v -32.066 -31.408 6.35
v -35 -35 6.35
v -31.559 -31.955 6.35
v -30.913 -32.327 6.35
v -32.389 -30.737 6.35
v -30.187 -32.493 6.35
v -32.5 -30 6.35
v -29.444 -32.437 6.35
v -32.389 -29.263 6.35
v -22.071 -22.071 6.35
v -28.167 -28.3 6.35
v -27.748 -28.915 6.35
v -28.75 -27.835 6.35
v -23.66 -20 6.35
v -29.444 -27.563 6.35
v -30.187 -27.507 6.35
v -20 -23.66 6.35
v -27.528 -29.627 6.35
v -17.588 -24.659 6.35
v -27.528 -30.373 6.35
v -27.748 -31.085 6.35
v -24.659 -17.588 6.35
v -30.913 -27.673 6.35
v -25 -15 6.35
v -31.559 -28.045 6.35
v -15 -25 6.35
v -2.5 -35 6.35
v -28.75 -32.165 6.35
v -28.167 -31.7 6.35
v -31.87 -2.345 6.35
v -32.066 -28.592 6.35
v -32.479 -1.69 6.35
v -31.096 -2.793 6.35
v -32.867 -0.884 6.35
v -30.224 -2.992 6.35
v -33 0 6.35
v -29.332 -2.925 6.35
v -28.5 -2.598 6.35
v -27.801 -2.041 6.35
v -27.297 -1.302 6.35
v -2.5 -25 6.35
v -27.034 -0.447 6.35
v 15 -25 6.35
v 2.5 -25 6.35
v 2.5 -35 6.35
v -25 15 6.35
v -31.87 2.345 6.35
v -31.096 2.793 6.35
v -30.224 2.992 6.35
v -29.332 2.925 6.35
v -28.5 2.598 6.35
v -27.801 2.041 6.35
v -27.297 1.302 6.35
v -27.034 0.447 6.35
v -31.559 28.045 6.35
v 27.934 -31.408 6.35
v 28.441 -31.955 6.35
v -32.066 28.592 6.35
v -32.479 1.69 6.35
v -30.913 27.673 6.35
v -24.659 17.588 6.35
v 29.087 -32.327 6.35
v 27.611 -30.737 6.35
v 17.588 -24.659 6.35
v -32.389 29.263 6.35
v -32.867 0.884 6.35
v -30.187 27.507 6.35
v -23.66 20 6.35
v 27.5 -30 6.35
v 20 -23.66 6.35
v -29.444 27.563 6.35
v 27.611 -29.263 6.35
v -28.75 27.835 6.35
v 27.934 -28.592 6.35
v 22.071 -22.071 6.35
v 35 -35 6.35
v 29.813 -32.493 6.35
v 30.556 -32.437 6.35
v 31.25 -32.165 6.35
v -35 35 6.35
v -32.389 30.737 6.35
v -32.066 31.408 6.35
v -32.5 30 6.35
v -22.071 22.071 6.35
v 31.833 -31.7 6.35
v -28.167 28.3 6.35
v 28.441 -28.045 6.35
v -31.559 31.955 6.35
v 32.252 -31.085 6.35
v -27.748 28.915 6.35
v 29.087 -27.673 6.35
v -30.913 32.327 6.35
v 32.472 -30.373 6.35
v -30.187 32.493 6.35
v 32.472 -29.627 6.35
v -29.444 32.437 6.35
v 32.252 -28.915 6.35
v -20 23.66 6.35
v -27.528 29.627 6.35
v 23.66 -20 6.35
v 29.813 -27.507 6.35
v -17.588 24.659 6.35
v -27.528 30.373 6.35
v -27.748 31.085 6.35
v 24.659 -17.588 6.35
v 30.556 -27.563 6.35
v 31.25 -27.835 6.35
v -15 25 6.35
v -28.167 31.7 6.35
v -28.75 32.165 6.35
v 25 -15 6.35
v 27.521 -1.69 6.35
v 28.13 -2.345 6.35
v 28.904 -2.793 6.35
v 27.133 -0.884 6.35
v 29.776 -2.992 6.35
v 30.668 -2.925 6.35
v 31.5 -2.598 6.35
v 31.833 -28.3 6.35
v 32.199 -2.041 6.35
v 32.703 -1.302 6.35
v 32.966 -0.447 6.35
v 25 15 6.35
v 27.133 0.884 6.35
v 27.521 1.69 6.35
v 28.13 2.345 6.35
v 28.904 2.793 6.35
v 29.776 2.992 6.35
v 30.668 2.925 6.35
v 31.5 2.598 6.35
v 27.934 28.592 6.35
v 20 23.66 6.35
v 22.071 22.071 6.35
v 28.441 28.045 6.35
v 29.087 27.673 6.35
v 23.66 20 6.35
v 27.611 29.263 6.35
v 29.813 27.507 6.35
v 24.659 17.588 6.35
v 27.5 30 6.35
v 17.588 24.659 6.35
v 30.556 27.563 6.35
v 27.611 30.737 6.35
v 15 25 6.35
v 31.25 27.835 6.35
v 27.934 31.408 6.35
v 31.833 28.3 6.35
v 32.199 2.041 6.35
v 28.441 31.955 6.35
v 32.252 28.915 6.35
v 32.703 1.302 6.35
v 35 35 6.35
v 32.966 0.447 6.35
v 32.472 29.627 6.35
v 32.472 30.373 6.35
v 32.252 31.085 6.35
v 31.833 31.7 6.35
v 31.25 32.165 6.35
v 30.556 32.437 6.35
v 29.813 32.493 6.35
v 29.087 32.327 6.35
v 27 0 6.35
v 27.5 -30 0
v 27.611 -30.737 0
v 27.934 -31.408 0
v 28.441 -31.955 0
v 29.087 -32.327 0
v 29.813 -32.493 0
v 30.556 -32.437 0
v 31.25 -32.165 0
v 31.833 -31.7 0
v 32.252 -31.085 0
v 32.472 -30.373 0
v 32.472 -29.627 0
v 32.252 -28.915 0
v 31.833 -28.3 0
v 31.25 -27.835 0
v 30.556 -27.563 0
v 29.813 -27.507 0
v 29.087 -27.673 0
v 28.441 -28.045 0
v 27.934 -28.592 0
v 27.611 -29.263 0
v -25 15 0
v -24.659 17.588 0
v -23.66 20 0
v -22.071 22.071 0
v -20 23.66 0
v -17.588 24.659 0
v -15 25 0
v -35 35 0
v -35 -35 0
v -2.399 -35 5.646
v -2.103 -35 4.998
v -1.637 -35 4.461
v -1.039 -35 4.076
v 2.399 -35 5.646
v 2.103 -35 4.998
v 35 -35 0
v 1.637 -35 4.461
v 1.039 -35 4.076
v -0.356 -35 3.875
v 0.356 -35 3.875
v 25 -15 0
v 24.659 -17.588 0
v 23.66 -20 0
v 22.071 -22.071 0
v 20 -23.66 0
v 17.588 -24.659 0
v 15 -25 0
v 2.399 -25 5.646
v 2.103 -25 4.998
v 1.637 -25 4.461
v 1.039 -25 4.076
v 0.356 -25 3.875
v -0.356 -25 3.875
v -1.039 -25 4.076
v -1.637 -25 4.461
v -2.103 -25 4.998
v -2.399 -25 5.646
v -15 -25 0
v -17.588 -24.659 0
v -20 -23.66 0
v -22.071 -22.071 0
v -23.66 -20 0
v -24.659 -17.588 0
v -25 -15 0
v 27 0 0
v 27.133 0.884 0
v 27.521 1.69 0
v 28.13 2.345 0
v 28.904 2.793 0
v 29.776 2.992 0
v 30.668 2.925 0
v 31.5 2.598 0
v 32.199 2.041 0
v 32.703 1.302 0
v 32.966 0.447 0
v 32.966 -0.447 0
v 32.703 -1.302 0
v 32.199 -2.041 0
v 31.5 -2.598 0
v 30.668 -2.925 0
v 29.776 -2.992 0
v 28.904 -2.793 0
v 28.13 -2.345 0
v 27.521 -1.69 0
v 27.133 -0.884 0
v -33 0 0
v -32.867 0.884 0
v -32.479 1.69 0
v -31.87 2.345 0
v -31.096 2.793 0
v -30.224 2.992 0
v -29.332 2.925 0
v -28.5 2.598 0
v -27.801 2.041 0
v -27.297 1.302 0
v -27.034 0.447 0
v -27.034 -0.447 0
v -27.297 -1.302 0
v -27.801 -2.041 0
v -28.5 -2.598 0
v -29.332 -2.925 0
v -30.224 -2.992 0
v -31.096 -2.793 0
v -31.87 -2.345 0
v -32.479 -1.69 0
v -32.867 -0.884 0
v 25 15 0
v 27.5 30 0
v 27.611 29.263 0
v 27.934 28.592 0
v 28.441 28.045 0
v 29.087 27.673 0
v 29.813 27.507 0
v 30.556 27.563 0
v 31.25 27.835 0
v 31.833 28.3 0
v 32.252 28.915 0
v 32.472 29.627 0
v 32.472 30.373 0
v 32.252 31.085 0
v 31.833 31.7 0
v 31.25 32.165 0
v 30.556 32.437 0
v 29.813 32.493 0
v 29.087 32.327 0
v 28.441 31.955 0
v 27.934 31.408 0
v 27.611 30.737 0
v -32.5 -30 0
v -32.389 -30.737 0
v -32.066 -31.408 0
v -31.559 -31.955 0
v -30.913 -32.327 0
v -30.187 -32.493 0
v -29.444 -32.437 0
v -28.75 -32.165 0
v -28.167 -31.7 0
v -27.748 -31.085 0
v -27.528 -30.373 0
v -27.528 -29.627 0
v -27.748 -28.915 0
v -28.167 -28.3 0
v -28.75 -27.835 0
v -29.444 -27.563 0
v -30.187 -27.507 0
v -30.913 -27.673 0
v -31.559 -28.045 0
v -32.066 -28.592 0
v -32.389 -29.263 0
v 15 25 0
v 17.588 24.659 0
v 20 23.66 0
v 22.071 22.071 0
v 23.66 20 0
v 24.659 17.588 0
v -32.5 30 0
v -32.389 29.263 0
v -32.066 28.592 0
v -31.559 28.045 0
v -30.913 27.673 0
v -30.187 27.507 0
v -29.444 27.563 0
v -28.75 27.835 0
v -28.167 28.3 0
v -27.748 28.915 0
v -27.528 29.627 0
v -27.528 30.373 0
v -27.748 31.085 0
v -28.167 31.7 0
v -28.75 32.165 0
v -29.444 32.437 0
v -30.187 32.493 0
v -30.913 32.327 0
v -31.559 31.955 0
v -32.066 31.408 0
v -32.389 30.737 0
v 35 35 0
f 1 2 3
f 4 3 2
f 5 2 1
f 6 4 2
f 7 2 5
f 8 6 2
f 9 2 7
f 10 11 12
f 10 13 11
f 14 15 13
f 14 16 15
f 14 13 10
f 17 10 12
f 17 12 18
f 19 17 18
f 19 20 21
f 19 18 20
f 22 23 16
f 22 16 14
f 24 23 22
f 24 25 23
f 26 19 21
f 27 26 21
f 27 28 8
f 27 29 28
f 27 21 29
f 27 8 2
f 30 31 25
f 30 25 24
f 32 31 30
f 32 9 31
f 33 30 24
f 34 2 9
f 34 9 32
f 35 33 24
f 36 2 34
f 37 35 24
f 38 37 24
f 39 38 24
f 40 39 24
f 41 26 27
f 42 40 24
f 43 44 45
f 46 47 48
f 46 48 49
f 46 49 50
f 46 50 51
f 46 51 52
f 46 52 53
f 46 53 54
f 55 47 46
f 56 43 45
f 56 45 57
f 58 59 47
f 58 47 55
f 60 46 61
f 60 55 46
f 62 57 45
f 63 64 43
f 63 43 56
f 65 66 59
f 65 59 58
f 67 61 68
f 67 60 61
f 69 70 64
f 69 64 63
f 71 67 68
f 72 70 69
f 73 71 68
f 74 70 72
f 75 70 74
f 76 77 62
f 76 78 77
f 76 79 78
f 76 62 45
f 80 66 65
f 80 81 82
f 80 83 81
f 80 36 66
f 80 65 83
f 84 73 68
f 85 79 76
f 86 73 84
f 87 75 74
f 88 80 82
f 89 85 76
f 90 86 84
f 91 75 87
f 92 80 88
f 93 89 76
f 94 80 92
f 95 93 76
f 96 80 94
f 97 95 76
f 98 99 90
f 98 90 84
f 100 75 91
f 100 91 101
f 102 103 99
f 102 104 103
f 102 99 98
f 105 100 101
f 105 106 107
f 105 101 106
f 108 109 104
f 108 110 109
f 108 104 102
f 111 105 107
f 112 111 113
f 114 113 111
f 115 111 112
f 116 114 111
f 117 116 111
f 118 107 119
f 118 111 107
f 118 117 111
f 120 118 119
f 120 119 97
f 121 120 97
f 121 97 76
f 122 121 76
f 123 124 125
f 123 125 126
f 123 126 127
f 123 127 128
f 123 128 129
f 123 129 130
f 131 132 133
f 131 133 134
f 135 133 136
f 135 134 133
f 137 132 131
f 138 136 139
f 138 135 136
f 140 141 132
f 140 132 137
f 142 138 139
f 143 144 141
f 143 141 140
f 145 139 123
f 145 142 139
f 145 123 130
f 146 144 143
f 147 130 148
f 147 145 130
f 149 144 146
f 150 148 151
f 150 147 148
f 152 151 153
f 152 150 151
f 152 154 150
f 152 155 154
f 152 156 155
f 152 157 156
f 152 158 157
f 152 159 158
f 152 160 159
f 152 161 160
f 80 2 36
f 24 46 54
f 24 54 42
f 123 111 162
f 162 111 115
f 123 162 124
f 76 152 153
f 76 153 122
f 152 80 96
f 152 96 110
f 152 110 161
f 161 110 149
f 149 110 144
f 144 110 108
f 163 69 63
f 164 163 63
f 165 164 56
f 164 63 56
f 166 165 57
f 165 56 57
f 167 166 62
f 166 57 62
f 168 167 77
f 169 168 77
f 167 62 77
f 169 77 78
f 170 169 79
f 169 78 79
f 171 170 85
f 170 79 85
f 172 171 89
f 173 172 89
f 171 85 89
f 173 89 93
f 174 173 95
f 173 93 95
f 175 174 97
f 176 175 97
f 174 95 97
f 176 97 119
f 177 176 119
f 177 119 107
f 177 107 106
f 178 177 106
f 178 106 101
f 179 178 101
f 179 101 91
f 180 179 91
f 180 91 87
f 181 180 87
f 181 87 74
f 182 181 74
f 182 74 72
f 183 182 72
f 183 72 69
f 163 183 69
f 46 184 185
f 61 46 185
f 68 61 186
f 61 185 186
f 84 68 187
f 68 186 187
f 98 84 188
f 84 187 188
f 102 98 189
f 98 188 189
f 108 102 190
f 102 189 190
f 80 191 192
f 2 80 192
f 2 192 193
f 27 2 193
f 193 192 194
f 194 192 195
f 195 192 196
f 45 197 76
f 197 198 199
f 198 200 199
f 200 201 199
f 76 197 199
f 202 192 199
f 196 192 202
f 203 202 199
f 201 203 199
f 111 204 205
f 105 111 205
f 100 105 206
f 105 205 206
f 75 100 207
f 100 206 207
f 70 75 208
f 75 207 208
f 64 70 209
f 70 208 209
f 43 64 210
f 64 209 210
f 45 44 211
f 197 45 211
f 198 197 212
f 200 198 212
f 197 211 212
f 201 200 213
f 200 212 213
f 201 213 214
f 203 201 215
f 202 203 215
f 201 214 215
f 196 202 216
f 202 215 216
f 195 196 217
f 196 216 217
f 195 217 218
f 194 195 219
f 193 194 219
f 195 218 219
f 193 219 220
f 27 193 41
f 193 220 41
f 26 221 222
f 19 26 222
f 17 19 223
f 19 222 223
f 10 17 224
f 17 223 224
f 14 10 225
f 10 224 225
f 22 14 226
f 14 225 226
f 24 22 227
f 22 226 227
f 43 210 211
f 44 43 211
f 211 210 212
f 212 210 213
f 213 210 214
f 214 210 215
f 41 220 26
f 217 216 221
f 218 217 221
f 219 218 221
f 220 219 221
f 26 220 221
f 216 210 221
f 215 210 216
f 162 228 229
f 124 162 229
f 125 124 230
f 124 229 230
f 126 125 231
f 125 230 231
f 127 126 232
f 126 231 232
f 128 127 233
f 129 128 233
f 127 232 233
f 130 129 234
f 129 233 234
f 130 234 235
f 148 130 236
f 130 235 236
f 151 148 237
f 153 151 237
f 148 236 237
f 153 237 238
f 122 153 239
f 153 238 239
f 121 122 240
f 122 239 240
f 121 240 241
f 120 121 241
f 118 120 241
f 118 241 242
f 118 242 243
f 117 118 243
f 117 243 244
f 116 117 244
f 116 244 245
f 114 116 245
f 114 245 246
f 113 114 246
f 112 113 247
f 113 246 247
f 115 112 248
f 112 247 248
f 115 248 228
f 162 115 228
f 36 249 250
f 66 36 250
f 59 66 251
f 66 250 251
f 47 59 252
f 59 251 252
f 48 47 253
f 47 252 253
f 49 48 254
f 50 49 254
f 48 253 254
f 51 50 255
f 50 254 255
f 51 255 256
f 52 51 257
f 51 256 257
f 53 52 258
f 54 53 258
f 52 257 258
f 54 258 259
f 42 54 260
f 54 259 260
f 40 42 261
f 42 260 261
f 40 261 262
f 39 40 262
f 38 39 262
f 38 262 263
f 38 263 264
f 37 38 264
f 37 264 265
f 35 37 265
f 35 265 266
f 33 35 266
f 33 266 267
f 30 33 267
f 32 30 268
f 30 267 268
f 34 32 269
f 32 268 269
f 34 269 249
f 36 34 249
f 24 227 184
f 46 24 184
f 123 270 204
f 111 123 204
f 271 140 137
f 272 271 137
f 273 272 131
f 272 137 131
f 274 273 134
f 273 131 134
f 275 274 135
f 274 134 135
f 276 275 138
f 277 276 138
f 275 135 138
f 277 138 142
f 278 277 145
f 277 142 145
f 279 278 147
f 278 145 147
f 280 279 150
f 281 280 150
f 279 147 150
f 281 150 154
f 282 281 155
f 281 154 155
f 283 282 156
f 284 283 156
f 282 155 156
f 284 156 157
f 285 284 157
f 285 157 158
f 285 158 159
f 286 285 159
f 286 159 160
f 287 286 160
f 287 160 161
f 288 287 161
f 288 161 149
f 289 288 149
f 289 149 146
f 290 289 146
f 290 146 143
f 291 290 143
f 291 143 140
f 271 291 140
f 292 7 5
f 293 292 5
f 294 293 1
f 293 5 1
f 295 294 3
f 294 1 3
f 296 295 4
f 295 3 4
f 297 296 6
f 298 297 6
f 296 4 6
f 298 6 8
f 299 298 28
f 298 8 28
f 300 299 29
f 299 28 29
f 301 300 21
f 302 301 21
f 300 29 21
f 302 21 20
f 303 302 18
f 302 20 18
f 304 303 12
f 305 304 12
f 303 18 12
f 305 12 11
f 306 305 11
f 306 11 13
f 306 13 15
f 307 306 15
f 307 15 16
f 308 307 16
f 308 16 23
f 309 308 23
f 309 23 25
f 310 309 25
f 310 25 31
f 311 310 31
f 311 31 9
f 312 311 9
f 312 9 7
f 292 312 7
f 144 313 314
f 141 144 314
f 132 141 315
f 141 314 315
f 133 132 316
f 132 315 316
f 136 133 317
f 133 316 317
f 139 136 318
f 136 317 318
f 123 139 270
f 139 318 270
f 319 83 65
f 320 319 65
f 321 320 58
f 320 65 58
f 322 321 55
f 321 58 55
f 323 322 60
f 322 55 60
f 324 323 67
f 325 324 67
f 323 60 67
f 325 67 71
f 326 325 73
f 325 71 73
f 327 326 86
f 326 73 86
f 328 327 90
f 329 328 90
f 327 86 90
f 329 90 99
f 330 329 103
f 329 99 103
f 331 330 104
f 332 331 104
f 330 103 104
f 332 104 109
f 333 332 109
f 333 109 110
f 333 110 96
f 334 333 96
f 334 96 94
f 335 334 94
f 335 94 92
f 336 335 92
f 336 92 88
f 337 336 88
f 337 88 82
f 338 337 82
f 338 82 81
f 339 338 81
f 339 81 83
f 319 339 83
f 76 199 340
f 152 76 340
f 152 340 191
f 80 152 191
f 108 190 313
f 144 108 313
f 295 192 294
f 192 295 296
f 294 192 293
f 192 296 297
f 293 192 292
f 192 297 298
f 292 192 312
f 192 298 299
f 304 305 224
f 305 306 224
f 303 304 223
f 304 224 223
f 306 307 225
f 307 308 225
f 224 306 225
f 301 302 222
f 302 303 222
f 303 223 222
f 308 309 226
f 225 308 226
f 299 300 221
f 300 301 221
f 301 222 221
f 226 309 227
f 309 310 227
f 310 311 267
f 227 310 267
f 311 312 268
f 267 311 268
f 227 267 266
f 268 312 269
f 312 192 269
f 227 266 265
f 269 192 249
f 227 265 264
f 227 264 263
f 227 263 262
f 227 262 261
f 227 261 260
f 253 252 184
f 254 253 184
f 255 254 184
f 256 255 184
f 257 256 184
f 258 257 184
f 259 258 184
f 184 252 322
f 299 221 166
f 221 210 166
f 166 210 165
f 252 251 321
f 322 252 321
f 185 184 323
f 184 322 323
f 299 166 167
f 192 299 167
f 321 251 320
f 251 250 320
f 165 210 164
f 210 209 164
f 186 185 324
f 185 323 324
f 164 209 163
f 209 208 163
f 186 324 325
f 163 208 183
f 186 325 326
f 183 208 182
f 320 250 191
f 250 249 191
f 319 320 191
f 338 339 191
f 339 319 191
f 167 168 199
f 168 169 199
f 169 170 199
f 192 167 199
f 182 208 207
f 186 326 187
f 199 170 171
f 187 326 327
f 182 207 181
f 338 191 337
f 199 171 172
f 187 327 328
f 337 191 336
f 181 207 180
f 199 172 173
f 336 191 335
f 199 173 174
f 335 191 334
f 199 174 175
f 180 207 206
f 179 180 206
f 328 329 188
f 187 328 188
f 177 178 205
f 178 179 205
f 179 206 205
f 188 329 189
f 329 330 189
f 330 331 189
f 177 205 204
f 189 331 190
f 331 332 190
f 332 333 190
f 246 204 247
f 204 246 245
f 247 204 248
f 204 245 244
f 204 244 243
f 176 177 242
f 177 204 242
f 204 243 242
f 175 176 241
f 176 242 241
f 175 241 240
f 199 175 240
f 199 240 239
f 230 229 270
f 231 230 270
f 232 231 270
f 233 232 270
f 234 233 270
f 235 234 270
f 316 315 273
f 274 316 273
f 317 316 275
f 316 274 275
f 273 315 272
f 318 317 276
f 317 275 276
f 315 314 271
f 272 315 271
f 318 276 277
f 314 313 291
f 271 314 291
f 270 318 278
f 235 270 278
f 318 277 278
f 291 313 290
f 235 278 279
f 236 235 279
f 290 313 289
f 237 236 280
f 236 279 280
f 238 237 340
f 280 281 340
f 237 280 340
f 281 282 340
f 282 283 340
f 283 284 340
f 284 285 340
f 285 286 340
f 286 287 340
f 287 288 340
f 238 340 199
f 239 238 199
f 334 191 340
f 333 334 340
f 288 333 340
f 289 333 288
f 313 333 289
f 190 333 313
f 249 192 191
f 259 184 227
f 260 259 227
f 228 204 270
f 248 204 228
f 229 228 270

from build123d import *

# Parameters (mm, degrees)
F1_DEPTH = 6.35
F3_D     = 5
F3_DEPTH = 14.4
F3_TIP   = 1.5021515476
F5_D     = 5
F5_DEPTH = 15
F5_TIP   = 1.5021515476


with BuildPart() as f1:
    # F0 (on Top) → F1 (new body)
    with BuildSketch(Plane.XY):
        with BuildLine():
            Line((-35, -35), (35, -35))
            Line((35, -35), (35, 0))
            Line((35, 0), (33, 0))
            ThreePointArc((33, 0), (30, -3), (27, 0))
            Line((27, 0), (25, 0))
            Line((25, 0), (25, -15))
            ThreePointArc((25, -15), (22.0710678119, -22.0710678119), (15, -25))
            Line((15, -25), (-15, -25))
            ThreePointArc((-15, -25), (-22.0710678119, -22.0710678119), (-25, -15))
            Line((-25, -15), (-25, 0))
            Line((-25, 0), (-27, 0))
            ThreePointArc((-27, 0), (-30, -3), (-33, 0))
            Line((-33, 0), (-35, 0))
            Line((-35, 0), (-35, -35))
        make_face()
        with BuildLine():
            Line((33, 0), (35, 0))
            Line((35, 0), (35, 35))
            Line((35, 35), (-35, 35))
            Line((-35, 35), (-35, 0))
            Line((-35, 0), (-33, 0))
            ThreePointArc((-33, 0), (-30, 3), (-27, 0))
            Line((-27, 0), (-25, 0))
            Line((-25, 0), (-25, 15))
            ThreePointArc((-25, 15), (-22.0710678119, 22.0710678119), (-15, 25))
            Line((-15, 25), (15, 25))
            ThreePointArc((15, 25), (22.0710678119, 22.0710678119), (25, 15))
            Line((25, 15), (25, 0))
            Line((25, 0), (27, 0))
            ThreePointArc((27, 0), (30, 3), (33, 0))
        make_face()
    extrude(amount=F1_DEPTH)

    # F3
    with Locations(Plane.XZ.offset(35)):
        with Locations((0, 6.35)):
            Hole(F3_D / 2, depth=F3_DEPTH)
            with Locations((0, 0, -(F3_DEPTH + F3_TIP / 2))):  # 118° drill point
                Cone(0, F3_D / 2, F3_TIP, mode=Mode.SUBTRACT)

    # F5
    with Locations(Plane(origin=(0, 0, 0), x_dir=(1, 0, 0), z_dir=(0, 0, -1))):
        with Locations((-30, 30), (30, 30), (30, -30), (-30, -30)):
            Hole(F5_D / 2, depth=F5_DEPTH)
            with Locations((0, 0, -(F5_DEPTH + F5_TIP / 2))):  # 118° drill point
                Cone(0, F5_D / 2, F5_TIP, mode=Mode.SUBTRACT)


solid = f1.part
